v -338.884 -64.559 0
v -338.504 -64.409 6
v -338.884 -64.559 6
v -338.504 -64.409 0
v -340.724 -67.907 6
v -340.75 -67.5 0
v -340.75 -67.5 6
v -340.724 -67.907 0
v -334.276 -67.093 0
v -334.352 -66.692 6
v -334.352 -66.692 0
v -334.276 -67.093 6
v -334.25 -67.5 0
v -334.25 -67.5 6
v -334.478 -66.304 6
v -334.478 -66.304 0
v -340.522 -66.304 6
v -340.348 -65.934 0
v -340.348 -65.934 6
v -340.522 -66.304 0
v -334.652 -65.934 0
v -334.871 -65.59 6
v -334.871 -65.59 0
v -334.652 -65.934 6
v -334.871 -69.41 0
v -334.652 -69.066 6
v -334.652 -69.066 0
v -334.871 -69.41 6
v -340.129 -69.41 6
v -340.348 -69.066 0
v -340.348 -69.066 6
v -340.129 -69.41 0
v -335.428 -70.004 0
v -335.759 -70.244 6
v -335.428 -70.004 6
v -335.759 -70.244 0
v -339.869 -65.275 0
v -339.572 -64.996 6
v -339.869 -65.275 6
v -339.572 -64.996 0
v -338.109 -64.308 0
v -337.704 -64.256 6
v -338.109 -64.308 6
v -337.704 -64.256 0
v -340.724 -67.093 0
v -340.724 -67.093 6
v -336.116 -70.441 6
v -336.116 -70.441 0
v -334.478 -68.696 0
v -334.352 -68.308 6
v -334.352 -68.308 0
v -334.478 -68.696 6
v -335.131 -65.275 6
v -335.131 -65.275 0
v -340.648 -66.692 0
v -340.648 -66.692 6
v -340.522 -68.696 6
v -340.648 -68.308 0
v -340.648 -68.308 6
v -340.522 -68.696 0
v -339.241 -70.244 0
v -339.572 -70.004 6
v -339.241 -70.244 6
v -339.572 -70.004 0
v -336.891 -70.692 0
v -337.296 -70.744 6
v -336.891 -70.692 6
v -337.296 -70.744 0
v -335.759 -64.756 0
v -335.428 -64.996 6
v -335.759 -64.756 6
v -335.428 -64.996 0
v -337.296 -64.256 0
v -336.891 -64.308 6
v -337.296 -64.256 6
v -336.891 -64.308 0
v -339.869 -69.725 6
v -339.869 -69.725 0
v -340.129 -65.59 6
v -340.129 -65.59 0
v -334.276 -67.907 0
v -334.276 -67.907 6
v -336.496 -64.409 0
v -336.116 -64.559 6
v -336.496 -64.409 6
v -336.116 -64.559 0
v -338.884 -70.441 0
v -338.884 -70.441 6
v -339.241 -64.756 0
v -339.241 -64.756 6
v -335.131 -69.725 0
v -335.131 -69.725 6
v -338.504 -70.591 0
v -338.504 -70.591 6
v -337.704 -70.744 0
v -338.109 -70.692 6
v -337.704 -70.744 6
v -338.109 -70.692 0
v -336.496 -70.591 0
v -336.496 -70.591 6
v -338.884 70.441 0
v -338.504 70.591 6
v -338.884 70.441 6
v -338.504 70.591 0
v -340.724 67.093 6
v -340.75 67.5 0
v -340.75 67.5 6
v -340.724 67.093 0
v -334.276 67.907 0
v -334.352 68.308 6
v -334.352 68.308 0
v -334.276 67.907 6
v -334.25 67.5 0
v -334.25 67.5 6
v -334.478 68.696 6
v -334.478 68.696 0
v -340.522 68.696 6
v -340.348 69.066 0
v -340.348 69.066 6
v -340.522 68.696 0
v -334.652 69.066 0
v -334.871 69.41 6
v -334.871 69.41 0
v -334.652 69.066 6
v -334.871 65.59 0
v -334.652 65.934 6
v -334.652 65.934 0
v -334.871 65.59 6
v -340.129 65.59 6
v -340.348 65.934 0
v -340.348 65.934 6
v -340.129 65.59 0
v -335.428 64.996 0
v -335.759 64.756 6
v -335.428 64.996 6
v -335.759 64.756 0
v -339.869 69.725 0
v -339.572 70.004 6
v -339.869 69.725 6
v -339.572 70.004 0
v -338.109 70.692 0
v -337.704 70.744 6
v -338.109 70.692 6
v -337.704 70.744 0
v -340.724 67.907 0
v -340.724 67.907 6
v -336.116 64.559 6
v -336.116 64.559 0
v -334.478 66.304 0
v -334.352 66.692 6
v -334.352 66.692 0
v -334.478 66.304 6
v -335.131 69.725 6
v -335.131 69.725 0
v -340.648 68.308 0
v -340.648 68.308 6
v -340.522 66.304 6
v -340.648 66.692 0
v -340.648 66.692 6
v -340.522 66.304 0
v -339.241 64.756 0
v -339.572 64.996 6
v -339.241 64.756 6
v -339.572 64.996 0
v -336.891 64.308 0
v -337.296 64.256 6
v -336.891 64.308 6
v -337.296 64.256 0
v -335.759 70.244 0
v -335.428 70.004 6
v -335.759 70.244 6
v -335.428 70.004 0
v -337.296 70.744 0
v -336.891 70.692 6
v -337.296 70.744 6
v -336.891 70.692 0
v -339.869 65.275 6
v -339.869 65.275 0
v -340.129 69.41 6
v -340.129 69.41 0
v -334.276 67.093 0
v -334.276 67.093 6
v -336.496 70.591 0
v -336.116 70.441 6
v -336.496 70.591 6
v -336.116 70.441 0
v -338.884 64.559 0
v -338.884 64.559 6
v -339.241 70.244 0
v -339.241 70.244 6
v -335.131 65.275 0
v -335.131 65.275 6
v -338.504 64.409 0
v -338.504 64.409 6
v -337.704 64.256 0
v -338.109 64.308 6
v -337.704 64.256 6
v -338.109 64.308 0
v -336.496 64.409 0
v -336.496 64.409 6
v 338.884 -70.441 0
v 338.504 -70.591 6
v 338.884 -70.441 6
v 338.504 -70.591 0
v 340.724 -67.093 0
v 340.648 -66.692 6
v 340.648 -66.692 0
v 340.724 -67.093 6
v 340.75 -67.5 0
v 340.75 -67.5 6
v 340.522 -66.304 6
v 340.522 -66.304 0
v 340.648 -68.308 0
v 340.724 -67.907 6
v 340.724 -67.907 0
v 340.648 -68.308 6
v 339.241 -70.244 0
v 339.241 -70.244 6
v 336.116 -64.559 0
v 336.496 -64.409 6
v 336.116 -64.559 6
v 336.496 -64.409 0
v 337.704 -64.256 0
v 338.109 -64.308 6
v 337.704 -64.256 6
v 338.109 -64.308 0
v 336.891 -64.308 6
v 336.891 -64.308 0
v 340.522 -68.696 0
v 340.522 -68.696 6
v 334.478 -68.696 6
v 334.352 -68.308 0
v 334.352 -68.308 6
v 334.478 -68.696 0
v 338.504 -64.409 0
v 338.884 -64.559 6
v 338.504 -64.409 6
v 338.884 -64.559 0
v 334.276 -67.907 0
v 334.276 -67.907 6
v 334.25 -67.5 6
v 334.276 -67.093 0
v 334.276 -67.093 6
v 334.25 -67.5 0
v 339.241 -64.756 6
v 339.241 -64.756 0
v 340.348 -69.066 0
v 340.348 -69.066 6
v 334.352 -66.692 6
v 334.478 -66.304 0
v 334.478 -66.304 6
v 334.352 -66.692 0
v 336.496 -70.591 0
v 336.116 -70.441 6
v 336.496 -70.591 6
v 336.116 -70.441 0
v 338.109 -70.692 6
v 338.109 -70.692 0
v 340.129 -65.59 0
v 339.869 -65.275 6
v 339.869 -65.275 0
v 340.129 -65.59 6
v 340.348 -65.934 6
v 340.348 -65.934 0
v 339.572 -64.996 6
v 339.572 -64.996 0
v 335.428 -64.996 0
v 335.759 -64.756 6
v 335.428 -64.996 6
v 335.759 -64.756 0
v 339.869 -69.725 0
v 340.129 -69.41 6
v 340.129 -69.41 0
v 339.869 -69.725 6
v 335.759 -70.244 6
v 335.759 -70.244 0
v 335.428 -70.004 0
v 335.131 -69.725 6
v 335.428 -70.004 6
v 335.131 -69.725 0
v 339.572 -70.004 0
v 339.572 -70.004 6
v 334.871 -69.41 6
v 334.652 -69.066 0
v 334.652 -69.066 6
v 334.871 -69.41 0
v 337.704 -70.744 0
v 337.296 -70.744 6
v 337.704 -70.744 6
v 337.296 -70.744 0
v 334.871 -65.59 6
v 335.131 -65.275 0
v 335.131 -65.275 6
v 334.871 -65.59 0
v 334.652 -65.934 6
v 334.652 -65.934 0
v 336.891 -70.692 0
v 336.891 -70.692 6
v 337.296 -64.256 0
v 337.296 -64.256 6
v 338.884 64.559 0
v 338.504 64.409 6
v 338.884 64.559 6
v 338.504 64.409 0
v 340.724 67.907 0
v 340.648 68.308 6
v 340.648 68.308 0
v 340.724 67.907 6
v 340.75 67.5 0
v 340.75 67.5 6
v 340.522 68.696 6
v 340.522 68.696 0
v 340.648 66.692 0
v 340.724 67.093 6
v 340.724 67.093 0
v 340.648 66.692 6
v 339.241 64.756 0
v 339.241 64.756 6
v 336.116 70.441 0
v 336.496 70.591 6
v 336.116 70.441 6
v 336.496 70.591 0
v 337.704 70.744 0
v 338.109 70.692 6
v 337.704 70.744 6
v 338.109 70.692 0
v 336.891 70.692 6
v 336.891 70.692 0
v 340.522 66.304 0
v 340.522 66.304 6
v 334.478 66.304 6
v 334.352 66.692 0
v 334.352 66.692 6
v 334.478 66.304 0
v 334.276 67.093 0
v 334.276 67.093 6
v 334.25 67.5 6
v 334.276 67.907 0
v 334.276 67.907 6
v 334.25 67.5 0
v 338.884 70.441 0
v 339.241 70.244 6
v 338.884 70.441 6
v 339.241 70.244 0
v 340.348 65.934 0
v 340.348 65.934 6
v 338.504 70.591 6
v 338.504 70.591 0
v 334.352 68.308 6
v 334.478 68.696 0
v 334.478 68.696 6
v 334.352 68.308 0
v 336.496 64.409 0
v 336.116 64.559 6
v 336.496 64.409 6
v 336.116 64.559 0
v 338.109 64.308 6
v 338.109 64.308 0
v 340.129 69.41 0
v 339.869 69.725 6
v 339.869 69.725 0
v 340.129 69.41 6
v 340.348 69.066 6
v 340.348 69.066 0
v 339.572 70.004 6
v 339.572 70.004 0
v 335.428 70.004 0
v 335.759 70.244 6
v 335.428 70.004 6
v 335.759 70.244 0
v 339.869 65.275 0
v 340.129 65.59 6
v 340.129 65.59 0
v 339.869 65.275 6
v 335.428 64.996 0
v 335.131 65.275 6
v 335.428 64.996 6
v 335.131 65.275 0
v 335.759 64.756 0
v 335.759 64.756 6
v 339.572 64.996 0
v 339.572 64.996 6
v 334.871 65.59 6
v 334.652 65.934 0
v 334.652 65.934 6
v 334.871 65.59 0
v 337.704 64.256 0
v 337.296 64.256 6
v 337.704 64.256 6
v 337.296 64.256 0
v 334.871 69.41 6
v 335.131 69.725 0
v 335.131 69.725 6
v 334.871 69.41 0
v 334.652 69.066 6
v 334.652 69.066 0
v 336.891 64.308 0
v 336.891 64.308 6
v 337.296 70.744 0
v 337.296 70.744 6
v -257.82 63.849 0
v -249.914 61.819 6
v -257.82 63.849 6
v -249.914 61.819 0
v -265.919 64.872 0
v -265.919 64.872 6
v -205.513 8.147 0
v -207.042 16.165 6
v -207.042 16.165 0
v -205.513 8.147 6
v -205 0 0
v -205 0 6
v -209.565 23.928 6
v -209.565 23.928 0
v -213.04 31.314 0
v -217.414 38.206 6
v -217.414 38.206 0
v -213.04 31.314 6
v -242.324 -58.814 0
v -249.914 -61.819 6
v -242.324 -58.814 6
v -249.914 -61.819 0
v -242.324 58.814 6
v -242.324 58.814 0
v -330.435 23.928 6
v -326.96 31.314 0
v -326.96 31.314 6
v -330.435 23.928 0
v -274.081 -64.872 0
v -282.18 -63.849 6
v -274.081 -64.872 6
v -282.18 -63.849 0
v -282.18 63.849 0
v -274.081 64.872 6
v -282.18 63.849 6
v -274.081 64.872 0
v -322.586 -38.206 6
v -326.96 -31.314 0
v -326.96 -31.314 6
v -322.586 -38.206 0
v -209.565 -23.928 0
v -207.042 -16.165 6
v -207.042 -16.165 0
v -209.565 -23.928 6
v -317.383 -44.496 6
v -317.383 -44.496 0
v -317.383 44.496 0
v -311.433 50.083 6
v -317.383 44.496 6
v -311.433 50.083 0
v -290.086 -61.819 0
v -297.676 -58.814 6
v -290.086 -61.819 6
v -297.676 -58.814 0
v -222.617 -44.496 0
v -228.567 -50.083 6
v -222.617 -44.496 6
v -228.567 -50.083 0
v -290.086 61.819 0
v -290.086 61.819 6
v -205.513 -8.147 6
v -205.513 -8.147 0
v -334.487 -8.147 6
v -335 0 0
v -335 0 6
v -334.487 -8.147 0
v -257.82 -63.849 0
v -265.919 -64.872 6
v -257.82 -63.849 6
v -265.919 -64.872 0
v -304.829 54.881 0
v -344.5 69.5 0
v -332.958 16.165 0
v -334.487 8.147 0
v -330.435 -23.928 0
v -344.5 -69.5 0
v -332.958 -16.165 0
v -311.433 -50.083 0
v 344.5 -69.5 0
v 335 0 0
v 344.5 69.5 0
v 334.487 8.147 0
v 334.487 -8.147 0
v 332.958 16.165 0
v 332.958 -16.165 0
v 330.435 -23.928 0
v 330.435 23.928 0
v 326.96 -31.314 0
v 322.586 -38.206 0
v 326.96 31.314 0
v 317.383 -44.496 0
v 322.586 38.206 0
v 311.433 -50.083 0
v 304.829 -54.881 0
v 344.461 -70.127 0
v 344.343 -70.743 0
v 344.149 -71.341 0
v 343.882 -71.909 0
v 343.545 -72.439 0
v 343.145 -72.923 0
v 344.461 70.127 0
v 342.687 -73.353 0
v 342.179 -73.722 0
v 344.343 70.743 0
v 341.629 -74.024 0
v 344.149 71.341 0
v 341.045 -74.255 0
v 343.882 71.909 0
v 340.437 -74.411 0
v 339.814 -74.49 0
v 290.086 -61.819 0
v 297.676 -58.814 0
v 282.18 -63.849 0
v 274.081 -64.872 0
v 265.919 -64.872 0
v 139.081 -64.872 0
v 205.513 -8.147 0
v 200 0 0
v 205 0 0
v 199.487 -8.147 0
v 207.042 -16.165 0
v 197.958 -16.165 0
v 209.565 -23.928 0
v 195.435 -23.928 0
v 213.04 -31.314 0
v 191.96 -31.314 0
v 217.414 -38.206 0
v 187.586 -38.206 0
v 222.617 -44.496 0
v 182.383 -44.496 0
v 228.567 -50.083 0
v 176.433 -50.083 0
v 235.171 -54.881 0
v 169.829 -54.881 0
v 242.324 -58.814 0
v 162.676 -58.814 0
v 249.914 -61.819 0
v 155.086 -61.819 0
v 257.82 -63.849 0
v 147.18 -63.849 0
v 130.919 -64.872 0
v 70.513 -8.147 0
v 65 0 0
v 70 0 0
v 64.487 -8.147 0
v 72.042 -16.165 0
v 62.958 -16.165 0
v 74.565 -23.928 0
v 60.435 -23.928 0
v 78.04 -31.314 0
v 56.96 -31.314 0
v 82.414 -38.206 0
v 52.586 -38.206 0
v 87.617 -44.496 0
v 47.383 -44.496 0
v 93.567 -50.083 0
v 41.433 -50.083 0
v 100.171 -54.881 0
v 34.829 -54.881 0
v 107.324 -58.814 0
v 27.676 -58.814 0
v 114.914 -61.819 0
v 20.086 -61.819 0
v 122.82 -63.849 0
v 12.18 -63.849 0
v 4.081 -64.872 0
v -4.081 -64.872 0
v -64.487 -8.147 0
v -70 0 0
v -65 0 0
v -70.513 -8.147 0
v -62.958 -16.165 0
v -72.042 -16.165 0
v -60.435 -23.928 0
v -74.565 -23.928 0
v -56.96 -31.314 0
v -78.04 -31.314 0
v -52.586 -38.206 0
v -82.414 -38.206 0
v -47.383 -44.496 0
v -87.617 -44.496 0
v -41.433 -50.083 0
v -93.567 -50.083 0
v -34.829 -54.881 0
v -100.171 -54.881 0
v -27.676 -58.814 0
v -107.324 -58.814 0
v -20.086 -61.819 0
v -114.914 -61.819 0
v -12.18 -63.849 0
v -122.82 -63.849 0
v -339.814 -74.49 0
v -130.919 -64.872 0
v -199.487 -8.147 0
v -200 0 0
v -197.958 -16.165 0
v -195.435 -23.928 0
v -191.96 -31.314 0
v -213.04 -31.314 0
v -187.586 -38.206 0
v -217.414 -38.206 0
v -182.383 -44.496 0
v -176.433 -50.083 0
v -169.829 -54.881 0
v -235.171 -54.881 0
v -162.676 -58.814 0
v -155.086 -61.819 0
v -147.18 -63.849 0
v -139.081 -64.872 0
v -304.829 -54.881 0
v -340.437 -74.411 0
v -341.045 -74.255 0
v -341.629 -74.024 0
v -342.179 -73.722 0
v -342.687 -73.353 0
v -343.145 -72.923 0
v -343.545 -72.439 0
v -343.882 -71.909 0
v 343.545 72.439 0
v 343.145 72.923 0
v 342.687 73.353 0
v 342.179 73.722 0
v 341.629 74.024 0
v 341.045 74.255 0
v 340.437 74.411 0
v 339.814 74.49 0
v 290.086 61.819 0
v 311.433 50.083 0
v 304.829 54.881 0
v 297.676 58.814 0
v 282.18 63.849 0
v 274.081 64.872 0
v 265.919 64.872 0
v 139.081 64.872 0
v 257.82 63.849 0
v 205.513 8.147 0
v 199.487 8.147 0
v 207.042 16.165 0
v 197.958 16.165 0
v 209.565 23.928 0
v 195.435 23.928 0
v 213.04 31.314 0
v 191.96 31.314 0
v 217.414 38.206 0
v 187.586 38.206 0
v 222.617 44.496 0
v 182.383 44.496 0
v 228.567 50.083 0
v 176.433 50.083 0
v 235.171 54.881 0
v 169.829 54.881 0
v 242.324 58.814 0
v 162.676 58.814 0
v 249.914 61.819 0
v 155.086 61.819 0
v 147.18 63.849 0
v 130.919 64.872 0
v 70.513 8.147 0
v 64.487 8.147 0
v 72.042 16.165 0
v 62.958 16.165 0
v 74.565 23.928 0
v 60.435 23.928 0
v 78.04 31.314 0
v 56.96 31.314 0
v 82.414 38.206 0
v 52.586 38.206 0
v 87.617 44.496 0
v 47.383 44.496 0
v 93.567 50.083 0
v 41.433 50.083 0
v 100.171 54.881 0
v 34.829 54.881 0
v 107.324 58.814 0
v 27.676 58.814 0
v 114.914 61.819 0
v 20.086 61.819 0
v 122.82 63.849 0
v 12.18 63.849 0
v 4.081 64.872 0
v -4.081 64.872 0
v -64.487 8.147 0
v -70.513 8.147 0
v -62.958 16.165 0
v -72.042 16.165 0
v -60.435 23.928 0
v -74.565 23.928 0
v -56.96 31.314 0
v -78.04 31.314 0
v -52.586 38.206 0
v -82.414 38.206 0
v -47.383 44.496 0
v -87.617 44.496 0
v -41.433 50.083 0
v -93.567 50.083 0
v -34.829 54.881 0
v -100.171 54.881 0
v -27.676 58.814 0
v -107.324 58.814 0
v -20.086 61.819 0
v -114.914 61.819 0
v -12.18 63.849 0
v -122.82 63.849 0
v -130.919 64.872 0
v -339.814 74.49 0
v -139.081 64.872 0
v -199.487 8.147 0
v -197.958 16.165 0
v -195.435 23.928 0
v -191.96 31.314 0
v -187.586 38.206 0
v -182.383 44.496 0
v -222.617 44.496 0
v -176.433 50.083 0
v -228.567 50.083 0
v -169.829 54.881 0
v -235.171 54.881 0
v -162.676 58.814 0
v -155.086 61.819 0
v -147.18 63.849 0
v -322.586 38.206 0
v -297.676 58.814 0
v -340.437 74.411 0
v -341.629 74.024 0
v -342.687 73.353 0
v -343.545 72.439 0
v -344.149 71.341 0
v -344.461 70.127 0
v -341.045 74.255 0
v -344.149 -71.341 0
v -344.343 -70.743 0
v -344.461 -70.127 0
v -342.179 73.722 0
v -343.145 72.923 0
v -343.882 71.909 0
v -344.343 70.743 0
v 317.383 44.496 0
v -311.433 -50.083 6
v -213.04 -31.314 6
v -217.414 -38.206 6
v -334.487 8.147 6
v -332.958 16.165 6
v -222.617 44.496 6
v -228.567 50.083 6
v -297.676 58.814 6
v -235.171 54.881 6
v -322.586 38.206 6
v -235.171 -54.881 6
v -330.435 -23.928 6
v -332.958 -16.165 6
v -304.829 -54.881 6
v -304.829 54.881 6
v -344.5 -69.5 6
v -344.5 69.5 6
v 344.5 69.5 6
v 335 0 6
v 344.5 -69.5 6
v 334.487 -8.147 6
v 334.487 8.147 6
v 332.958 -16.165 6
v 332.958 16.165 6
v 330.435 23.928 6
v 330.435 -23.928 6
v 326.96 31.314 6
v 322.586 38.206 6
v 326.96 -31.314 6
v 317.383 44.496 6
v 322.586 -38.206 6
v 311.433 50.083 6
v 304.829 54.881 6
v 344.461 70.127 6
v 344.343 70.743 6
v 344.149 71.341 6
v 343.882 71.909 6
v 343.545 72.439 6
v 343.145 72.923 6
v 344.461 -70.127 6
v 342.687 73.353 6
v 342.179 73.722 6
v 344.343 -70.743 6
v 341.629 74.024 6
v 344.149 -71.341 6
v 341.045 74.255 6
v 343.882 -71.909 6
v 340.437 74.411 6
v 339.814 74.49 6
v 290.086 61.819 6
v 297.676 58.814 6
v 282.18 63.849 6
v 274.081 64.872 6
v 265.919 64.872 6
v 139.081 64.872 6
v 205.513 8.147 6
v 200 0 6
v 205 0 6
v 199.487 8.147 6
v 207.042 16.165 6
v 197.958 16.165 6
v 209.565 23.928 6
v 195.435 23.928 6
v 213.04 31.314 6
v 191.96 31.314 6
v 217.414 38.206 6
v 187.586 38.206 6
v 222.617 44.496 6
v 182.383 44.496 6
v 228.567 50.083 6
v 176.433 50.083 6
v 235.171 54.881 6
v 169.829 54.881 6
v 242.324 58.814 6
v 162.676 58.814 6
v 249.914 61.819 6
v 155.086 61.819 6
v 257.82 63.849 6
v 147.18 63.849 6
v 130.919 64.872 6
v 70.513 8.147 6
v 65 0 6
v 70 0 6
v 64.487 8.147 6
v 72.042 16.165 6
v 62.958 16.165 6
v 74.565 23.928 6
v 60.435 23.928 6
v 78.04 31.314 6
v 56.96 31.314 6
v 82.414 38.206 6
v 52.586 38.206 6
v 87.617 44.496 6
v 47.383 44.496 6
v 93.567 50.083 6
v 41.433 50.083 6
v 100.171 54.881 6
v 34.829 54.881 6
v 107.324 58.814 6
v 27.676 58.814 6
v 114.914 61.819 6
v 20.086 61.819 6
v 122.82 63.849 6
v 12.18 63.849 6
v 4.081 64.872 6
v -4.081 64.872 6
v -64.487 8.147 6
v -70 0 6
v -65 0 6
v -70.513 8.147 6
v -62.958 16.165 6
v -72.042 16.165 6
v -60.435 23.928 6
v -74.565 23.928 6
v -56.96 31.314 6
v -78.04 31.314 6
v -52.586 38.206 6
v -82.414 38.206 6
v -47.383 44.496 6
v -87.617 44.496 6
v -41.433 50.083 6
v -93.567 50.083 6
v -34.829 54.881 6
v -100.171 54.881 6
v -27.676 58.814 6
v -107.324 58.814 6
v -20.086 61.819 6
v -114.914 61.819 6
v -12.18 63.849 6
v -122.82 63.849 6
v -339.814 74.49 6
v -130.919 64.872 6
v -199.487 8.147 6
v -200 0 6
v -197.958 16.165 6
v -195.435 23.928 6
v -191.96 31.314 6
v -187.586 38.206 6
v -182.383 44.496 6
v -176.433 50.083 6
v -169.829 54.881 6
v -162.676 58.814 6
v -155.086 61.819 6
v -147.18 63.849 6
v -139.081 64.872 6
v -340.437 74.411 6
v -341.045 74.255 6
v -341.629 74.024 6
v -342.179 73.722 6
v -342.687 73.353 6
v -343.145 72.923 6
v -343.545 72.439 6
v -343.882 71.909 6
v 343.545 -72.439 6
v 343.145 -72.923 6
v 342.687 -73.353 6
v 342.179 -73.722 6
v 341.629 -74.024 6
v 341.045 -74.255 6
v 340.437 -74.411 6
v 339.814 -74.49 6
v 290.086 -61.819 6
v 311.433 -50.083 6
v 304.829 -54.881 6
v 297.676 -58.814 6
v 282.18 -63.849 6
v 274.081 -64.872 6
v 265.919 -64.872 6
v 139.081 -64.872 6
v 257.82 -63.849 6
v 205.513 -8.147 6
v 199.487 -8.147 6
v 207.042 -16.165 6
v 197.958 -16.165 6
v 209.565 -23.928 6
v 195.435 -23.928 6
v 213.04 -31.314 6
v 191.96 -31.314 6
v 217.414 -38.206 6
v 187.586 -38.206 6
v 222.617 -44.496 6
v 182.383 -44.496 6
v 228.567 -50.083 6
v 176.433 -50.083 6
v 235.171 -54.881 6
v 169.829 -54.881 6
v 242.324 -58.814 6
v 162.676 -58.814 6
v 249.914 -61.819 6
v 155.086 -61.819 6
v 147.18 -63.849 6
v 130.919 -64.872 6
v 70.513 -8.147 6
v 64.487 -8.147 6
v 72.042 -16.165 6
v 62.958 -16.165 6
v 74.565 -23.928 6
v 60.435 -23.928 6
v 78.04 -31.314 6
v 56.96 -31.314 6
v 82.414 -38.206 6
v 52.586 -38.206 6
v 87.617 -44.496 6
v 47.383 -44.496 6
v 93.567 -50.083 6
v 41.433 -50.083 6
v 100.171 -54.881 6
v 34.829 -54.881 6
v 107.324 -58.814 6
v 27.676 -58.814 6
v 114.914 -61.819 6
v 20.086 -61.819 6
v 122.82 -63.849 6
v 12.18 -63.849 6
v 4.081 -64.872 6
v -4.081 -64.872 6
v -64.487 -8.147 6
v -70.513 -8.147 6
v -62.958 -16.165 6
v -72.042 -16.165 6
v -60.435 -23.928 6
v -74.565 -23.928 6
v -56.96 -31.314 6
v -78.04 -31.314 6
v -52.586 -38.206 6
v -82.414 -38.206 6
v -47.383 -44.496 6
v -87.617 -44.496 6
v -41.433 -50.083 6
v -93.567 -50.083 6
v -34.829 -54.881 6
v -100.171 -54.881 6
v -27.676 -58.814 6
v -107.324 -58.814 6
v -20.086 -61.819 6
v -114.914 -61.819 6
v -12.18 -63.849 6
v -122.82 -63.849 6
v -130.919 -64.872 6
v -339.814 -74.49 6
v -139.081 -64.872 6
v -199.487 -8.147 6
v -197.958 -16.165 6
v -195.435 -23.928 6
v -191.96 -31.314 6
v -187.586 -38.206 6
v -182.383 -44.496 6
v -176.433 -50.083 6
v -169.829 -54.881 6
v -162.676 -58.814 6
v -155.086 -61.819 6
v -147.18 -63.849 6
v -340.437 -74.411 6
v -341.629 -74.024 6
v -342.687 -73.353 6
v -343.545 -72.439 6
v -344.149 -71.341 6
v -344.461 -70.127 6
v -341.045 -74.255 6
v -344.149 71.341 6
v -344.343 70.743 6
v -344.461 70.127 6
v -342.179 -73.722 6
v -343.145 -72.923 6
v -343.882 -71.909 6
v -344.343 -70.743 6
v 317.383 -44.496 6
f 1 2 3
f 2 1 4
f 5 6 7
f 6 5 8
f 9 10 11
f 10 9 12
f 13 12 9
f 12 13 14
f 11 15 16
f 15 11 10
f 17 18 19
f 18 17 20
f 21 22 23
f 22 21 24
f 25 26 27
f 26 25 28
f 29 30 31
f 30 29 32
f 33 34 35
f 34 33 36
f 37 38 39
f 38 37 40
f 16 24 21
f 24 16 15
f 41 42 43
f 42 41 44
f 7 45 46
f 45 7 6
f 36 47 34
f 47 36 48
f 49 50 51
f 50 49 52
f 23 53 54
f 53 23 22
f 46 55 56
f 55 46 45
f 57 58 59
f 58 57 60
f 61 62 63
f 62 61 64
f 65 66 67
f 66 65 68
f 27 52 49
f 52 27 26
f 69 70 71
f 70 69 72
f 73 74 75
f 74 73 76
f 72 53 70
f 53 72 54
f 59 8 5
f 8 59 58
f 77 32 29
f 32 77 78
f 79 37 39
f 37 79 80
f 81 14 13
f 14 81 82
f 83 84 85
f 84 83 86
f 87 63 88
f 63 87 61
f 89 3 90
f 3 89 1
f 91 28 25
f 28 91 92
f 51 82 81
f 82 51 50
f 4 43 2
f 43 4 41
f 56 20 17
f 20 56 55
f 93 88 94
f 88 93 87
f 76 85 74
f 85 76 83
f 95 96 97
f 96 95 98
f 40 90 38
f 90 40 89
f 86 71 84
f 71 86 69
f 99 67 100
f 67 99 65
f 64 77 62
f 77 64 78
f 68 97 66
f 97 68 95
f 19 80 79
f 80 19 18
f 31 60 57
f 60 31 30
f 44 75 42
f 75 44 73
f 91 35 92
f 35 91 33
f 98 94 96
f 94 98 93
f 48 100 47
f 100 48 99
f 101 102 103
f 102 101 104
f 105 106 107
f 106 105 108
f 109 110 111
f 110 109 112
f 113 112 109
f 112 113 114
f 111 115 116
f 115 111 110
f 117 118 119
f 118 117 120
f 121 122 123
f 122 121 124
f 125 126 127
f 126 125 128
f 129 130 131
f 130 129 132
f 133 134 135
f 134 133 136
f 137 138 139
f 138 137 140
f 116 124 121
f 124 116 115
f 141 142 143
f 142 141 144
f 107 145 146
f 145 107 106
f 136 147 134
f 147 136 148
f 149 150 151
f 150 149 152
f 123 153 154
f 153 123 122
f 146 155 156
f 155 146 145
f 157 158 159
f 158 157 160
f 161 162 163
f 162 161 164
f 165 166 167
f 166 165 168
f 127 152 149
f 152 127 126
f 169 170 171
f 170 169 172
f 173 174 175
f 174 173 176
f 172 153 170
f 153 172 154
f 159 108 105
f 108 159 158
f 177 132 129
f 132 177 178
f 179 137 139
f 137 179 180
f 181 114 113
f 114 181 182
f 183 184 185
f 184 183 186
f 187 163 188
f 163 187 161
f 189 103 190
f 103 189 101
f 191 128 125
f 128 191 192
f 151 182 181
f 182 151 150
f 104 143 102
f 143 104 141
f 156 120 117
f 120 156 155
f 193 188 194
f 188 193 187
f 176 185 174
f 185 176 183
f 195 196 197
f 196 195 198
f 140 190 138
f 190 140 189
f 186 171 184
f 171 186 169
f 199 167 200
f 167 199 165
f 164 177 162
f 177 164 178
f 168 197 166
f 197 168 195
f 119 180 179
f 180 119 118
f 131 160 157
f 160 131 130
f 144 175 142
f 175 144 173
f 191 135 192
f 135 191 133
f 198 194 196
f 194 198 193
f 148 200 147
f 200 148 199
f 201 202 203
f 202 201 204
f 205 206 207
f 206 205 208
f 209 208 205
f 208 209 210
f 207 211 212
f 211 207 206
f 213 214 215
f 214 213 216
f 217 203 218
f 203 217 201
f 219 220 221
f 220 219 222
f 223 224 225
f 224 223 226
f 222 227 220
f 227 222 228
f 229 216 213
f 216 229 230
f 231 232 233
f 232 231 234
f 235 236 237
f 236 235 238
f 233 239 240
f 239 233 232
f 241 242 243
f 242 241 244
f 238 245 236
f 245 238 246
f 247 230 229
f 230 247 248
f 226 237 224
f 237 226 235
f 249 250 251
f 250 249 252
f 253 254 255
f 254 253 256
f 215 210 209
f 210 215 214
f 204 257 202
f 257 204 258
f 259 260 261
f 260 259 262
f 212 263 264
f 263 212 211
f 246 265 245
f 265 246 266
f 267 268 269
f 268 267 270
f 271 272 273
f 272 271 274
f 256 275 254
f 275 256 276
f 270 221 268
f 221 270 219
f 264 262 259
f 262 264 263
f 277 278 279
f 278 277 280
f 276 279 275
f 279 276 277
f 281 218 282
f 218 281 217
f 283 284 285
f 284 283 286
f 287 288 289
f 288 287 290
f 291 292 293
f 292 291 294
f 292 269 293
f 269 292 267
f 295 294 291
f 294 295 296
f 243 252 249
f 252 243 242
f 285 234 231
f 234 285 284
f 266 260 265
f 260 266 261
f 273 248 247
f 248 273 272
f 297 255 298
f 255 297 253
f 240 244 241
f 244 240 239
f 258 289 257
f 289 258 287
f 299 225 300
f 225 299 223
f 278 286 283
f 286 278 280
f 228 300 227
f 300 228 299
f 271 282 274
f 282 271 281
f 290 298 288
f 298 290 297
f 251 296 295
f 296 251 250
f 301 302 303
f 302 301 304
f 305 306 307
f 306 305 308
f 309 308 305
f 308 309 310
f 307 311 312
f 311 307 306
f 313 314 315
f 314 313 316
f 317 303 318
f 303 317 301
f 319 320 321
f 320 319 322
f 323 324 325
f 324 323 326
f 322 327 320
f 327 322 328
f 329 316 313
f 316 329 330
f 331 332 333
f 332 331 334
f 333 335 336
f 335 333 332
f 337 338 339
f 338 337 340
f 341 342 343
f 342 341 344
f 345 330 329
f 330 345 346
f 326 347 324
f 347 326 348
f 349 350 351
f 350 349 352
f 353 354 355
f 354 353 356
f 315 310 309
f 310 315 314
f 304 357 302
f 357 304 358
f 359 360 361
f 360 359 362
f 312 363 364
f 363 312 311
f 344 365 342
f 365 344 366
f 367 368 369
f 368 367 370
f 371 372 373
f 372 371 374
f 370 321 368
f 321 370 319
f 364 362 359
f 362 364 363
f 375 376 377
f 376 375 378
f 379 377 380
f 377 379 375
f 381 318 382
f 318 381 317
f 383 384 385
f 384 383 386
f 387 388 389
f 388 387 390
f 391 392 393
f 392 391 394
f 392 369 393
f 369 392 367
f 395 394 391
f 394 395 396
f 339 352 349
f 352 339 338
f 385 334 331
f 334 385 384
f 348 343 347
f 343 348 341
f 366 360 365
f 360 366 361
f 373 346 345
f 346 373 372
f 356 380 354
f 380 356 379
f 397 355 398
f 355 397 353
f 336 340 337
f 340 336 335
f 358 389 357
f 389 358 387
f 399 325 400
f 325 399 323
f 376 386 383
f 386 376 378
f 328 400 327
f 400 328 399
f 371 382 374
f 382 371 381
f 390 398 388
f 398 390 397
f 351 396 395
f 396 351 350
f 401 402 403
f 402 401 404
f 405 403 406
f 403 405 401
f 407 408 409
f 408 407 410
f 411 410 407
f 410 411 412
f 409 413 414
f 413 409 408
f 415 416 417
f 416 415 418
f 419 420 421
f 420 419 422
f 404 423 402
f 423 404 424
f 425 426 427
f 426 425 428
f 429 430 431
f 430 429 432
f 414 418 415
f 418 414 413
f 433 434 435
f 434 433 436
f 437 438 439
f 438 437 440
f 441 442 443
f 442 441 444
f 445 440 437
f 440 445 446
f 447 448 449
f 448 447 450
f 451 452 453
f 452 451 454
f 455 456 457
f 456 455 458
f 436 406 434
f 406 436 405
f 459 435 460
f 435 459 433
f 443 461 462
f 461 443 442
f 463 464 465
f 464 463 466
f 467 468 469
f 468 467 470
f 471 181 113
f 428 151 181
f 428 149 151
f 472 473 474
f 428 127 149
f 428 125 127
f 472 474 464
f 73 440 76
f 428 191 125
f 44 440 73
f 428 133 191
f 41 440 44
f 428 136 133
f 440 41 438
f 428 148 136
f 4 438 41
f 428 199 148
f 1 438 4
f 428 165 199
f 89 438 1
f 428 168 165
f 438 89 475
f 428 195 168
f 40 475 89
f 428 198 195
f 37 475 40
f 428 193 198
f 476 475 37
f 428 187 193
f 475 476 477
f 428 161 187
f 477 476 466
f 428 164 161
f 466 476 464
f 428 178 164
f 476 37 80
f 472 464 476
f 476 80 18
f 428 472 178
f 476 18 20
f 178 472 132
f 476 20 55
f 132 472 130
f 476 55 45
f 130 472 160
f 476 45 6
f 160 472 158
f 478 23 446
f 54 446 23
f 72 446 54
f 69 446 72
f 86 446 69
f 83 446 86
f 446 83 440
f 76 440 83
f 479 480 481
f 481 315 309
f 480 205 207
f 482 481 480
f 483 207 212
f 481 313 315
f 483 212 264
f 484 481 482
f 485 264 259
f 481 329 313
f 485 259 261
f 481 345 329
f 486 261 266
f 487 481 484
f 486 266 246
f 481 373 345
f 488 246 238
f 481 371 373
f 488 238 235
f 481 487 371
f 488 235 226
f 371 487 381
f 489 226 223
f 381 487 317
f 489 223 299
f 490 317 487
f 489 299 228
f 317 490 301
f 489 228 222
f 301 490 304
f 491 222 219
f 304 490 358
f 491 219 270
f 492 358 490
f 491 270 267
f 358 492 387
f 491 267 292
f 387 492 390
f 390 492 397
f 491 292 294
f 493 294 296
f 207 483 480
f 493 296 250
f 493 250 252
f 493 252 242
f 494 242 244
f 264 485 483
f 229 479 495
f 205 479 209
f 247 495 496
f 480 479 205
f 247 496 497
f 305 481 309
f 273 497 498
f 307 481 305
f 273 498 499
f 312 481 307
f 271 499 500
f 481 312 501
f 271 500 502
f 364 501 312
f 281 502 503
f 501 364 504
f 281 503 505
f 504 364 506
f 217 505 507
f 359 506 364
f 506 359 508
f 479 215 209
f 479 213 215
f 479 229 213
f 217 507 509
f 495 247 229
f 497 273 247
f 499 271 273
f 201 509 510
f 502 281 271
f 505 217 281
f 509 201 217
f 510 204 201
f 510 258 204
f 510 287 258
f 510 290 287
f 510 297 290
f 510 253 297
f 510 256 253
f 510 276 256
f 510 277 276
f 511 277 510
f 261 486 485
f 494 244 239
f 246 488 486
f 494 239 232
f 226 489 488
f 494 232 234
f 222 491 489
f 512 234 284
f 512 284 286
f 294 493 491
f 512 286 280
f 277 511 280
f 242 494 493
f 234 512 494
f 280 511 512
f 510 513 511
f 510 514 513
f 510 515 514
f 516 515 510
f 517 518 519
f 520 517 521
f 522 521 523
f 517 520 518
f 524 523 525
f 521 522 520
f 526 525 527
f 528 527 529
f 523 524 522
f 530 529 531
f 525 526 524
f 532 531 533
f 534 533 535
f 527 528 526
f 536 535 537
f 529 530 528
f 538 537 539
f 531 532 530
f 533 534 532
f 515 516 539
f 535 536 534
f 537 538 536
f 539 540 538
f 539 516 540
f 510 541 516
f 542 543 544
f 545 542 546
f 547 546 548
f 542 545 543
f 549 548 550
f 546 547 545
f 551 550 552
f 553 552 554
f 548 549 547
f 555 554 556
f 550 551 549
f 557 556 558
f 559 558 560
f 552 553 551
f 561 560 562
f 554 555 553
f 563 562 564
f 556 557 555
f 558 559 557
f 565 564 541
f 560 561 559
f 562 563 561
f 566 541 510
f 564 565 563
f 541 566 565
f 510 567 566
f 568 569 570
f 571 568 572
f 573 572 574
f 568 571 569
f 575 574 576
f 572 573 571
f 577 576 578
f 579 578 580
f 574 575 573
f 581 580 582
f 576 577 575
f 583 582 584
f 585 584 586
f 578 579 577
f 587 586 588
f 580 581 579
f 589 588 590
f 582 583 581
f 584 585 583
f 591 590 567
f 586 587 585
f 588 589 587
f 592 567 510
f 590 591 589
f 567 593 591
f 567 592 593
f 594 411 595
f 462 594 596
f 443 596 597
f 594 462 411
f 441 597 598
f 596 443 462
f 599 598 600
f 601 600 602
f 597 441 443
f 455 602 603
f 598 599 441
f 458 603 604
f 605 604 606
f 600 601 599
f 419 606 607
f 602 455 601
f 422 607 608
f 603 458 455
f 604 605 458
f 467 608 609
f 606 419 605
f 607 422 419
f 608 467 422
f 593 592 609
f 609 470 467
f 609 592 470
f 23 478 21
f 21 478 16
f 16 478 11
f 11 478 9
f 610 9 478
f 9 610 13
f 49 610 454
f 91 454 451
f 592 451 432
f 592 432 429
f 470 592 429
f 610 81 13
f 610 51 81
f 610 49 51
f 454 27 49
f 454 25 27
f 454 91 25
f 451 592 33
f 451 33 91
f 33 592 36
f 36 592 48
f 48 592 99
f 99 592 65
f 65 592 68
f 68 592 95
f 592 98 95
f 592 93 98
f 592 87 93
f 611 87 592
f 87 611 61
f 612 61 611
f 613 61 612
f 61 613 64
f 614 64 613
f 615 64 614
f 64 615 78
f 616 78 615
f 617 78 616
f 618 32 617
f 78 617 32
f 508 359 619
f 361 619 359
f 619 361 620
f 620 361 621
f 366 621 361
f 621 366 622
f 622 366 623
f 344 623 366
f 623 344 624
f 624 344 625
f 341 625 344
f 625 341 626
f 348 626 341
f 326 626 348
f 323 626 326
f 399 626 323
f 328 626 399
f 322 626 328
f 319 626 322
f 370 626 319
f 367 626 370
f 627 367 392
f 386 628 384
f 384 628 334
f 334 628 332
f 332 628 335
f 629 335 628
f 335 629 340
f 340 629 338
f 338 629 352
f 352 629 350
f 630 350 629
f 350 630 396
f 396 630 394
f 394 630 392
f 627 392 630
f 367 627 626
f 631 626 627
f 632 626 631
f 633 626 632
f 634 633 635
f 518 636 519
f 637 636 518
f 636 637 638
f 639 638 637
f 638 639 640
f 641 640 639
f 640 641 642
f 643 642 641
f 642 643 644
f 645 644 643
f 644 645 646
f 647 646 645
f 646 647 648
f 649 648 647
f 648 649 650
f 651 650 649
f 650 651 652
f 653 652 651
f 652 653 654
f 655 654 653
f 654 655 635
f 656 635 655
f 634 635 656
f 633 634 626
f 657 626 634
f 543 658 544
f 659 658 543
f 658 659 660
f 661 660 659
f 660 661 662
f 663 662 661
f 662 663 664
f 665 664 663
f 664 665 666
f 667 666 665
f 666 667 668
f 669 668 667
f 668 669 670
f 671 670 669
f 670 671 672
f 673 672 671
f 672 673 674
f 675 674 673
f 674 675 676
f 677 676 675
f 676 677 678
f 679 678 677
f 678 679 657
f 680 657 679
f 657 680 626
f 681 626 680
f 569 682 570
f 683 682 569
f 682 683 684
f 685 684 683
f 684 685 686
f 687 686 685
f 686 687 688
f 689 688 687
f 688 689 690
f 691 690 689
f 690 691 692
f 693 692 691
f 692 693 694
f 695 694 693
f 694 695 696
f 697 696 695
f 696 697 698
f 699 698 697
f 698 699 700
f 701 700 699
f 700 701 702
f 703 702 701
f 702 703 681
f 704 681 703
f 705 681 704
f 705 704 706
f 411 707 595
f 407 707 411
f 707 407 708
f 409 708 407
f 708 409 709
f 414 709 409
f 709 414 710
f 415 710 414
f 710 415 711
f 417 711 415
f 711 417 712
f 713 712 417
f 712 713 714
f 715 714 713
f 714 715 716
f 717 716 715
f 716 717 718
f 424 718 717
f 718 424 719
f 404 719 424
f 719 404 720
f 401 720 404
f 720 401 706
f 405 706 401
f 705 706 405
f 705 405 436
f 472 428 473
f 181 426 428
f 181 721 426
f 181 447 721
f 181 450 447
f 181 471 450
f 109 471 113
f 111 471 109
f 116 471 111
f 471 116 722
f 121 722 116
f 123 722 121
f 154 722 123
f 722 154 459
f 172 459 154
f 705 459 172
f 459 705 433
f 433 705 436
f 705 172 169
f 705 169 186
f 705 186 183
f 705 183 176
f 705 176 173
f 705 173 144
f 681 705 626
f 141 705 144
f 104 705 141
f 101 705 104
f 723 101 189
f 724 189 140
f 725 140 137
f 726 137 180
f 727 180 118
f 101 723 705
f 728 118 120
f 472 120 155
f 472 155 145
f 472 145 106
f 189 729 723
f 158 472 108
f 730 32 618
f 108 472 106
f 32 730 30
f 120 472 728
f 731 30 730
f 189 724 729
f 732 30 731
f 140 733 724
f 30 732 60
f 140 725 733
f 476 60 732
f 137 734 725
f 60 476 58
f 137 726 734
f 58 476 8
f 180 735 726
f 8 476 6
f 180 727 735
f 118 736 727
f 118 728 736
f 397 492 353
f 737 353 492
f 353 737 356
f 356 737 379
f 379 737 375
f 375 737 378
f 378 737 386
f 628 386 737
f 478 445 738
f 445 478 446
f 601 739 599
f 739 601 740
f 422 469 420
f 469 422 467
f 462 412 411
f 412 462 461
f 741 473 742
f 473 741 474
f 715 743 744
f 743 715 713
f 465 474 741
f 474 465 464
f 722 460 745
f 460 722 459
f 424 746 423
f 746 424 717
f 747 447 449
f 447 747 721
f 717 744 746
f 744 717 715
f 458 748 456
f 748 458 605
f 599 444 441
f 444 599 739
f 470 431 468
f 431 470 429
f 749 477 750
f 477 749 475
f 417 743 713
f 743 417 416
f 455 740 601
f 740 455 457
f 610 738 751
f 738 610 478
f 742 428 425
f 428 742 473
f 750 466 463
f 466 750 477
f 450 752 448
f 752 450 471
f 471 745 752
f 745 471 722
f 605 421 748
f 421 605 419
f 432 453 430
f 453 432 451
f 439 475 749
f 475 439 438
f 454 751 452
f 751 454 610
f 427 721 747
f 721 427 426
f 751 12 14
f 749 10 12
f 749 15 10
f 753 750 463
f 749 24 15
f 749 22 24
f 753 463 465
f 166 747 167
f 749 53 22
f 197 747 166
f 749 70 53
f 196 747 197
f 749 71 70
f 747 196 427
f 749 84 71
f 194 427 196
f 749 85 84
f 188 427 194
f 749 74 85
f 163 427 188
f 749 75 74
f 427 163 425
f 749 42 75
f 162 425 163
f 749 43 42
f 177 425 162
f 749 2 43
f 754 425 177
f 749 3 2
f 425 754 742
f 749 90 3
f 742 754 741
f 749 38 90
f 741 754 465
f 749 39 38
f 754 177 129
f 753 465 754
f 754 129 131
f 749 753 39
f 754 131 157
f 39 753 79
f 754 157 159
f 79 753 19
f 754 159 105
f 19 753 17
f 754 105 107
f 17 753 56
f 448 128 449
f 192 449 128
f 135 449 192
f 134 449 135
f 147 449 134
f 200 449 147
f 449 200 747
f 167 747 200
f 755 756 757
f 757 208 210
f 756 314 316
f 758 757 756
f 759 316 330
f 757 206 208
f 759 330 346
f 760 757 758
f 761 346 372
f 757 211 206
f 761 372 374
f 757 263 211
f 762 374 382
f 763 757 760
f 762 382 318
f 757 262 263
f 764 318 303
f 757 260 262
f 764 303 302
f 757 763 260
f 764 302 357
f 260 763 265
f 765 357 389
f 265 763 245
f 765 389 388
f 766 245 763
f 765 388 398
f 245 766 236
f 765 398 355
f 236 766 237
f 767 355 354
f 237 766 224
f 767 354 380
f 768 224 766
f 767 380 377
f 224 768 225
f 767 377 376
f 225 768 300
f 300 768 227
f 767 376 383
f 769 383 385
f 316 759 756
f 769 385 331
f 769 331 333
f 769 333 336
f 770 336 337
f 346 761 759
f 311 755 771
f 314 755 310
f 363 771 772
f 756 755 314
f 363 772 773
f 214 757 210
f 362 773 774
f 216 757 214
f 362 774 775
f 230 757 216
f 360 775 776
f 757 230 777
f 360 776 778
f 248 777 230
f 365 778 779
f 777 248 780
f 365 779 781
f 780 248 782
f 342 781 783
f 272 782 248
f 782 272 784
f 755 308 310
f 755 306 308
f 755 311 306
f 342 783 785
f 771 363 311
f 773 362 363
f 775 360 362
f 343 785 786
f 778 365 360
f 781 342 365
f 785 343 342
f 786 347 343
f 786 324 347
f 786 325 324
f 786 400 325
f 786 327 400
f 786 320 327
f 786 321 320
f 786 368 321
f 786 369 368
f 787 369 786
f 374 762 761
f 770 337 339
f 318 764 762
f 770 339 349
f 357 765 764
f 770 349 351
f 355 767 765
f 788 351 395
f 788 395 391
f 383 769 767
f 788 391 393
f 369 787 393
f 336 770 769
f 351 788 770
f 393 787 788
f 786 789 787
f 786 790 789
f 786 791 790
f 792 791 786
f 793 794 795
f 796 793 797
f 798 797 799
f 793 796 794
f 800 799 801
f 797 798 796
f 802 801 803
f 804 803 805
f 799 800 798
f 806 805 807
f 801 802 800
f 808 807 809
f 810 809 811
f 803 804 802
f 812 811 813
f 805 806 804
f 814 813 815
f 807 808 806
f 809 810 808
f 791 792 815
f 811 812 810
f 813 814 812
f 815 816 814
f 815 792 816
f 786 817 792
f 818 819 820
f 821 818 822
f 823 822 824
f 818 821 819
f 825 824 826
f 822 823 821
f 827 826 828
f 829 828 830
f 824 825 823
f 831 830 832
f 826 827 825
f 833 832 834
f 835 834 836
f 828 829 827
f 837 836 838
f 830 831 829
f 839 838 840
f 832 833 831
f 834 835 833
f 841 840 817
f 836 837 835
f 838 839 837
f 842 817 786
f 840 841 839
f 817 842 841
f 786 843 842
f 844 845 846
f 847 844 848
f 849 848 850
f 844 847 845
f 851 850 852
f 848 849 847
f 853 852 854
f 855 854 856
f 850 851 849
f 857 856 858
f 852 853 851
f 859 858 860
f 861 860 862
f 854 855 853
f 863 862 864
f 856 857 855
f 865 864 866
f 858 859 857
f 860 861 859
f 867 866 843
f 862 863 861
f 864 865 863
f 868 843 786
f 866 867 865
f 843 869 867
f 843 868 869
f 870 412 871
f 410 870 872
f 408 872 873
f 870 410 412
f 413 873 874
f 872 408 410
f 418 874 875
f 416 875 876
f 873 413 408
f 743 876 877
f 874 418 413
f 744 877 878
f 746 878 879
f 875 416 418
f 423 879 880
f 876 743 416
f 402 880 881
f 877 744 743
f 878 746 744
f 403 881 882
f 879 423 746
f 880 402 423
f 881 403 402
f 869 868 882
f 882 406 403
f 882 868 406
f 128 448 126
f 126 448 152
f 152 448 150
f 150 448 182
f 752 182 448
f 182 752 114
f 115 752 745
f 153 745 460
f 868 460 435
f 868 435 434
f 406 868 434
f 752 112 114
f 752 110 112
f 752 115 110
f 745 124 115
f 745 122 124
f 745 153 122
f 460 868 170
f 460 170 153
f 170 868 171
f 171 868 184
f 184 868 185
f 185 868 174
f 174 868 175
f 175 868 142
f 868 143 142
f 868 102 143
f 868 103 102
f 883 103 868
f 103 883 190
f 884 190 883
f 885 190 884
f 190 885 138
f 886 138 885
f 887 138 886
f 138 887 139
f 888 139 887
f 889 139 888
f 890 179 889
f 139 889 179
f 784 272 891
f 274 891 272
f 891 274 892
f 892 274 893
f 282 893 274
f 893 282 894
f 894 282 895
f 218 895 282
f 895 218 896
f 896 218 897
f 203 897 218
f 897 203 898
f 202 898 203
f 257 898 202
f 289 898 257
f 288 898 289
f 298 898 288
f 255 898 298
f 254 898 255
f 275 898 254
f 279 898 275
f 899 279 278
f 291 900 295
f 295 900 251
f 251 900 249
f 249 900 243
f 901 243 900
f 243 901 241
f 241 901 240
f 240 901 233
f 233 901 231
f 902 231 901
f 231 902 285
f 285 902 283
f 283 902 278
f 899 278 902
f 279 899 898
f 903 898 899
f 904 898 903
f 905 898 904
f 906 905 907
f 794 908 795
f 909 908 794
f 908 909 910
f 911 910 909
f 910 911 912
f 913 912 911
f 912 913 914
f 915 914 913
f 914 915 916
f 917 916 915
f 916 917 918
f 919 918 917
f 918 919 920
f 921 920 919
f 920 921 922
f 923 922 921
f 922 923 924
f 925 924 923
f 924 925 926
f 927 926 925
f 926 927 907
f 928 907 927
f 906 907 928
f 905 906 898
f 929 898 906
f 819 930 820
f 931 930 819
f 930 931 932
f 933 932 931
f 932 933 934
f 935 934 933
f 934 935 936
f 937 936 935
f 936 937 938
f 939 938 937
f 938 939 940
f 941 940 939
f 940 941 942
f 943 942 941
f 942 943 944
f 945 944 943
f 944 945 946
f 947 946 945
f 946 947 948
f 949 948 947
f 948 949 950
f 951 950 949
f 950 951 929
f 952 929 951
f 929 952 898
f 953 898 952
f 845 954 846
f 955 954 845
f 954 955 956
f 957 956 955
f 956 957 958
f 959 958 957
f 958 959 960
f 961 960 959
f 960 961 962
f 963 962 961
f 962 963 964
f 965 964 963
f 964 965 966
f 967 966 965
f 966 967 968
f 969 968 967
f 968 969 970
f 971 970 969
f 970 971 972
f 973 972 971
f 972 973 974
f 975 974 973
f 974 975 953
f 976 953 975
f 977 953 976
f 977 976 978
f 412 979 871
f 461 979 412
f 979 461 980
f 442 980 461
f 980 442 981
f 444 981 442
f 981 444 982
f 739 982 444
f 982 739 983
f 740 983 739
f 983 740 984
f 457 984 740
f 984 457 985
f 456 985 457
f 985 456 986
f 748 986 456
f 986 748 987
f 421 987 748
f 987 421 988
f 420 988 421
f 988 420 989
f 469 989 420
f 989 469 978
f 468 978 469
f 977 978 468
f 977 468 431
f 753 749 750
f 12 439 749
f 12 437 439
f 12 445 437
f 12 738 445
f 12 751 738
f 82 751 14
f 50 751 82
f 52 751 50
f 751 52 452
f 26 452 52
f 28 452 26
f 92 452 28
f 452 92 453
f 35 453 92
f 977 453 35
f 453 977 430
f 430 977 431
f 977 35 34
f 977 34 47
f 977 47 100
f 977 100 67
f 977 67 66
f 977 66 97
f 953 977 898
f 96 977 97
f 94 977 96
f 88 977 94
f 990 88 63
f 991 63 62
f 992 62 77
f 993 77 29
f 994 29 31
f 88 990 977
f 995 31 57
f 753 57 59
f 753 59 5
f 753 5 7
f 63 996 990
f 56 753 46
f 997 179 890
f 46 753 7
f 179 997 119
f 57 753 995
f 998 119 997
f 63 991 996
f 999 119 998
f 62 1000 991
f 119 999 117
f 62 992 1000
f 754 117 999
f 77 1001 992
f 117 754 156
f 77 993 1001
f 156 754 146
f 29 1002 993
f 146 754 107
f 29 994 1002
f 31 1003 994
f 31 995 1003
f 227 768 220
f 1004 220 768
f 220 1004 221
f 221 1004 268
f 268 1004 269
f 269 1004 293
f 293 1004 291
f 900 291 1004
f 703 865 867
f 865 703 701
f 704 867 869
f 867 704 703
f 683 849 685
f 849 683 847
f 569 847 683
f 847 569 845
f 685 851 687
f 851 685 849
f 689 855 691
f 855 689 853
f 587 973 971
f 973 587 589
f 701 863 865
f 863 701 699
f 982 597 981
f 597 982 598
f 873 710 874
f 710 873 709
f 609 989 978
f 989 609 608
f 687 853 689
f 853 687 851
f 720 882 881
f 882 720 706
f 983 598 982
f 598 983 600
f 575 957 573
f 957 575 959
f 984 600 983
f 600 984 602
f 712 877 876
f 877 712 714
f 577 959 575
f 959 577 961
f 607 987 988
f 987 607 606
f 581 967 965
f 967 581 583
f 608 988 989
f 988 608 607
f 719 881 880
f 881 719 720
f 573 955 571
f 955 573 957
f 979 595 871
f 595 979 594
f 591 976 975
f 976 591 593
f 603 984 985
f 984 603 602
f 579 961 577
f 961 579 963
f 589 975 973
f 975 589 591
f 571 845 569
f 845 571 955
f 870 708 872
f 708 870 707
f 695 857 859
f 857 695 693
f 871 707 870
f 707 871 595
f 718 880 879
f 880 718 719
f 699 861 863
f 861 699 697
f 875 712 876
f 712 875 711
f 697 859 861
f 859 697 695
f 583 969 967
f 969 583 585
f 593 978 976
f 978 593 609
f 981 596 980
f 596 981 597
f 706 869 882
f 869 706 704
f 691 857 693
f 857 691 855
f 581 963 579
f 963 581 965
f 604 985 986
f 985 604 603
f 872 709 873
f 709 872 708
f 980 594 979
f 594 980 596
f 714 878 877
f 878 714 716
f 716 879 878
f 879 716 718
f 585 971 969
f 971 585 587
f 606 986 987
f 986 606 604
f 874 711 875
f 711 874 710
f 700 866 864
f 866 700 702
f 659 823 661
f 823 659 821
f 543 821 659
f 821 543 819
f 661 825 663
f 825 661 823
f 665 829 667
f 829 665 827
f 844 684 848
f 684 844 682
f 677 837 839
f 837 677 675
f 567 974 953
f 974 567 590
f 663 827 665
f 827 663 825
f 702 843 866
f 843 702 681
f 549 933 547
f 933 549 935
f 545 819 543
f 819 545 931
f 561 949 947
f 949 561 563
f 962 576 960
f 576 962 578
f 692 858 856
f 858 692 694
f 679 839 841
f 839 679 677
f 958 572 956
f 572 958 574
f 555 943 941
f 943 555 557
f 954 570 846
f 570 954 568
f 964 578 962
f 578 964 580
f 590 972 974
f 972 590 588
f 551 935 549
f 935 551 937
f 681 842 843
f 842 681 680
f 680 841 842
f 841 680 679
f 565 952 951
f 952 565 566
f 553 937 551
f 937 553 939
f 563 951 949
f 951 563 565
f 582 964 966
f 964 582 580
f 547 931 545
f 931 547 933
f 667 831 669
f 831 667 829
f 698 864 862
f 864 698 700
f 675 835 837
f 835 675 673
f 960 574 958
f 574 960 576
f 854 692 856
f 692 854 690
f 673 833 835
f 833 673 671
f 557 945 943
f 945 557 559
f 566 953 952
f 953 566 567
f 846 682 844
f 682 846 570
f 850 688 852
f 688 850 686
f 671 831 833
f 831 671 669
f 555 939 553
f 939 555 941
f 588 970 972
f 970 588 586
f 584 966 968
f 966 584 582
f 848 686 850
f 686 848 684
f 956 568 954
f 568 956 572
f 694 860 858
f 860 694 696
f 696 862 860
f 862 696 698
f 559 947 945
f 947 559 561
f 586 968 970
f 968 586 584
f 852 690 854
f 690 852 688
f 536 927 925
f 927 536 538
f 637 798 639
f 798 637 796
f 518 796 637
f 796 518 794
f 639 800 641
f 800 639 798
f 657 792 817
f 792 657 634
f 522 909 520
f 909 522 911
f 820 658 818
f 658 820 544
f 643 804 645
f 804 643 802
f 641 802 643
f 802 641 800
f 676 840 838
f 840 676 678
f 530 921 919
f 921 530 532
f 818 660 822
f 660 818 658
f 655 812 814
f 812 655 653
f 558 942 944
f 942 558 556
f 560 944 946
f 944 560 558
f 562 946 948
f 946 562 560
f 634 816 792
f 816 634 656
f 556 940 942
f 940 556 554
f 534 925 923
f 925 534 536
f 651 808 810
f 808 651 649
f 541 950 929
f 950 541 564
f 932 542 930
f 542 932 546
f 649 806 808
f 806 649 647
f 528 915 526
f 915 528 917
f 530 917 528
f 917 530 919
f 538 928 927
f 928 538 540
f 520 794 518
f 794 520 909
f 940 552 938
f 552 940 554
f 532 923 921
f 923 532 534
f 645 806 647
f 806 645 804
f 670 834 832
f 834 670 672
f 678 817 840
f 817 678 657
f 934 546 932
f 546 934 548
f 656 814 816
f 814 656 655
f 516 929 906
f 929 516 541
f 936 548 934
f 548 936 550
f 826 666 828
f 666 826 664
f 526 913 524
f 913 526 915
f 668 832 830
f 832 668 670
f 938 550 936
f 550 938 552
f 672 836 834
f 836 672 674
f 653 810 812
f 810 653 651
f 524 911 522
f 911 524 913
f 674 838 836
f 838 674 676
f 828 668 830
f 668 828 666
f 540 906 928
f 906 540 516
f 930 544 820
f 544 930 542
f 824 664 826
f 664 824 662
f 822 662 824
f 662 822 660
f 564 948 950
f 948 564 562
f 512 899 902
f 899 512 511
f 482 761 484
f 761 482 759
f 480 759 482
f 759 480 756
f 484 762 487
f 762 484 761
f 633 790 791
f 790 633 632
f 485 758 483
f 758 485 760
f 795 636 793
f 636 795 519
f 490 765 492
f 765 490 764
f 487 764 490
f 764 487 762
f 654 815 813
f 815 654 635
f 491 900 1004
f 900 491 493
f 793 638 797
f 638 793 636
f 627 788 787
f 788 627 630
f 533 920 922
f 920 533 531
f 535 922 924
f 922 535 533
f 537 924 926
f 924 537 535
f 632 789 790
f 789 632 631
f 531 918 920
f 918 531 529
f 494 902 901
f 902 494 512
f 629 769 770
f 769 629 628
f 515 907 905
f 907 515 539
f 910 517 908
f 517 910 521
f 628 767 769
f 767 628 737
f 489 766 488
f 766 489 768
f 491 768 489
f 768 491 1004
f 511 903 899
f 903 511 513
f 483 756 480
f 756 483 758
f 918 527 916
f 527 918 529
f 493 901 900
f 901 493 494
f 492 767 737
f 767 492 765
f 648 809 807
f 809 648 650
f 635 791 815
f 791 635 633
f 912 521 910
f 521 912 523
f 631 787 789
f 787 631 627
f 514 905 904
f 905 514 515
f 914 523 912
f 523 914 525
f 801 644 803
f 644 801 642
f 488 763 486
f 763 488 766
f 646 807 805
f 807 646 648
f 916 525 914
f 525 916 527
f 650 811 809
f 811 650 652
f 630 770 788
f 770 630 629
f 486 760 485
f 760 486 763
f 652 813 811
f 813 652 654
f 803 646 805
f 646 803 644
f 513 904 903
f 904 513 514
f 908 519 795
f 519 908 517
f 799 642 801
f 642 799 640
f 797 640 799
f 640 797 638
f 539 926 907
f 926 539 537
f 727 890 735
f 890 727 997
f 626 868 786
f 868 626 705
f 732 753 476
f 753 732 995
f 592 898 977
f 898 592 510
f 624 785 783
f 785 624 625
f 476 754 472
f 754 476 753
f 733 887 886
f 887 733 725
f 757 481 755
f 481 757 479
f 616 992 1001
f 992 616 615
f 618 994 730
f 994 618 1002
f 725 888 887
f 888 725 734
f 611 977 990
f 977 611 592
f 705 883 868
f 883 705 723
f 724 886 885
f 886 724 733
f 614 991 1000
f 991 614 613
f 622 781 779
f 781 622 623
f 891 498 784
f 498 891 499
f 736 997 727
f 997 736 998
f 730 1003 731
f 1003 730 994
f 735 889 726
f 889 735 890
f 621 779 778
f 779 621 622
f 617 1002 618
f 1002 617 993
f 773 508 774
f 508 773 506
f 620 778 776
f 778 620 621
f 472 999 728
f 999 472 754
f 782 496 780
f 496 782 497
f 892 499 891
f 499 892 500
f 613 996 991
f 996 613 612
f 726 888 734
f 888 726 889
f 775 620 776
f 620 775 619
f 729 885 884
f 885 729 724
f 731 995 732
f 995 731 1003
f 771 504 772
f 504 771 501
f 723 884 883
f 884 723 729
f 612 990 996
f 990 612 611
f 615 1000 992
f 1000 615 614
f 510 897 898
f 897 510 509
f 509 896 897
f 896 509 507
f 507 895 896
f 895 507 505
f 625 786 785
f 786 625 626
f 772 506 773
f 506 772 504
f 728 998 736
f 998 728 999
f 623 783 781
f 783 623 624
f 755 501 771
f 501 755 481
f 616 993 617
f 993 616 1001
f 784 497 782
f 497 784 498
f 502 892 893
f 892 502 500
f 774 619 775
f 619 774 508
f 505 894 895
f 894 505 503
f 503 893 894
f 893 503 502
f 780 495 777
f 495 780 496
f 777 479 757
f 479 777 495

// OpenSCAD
$fn = 50;

difference() {
	union() {
		hull() {
			translate(v = [-339.5, 69.5, 0]) {
				cylinder(h = 6, r = 5);
			}
			translate(v = [339.5, 69.5, 0]) {
				cylinder(h = 6, r = 5);
			}
			translate(v = [-339.5, -69.5, 0]) {
				cylinder(h = 6, r = 5);
			}
			translate(v = [339.5, -69.5, 0]) {
				cylinder(h = 6, r = 5);
			}
		}
	}
	union() {
		translate(v = [-337.5, -67.5, -100.0]) {
			cylinder(h = 200, r = 3.25);
		}
		translate(v = [-337.5, 67.5, -100.0]) {
			cylinder(h = 200, r = 3.25);
		}
		translate(v = [337.5, -67.5, -100.0]) {
			cylinder(h = 200, r = 3.25);
		}
		translate(v = [337.5, 67.5, -100.0]) {
			cylinder(h = 200, r = 3.25);
		}
		translate(v = [-337.5, -67.5, -100.0]) {
			cylinder(h = 200, r = 1.8);
		}
		translate(v = [-337.5, 67.5, -100.0]) {
			cylinder(h = 200, r = 1.8);
		}
		translate(v = [337.5, -67.5, -100.0]) {
			cylinder(h = 200, r = 1.8);
		}
		translate(v = [337.5, 67.5, -100.0]) {
			cylinder(h = 200, r = 1.8);
		}
		translate(v = [-270.0, 0, 0.0]) {
			cylinder(h = 6, r = 65.0);
		}
		translate(v = [-135.0, 0, 0.0]) {
			cylinder(h = 6, r = 65.0);
		}
		cylinder(h = 6, r = 65.0);
		translate(v = [135.0, 0, 0.0]) {
			cylinder(h = 6, r = 65.0);
		}
		translate(v = [270.0, 0, 0.0]) {
			cylinder(h = 6, r = 65.0);
		}
	}
}
